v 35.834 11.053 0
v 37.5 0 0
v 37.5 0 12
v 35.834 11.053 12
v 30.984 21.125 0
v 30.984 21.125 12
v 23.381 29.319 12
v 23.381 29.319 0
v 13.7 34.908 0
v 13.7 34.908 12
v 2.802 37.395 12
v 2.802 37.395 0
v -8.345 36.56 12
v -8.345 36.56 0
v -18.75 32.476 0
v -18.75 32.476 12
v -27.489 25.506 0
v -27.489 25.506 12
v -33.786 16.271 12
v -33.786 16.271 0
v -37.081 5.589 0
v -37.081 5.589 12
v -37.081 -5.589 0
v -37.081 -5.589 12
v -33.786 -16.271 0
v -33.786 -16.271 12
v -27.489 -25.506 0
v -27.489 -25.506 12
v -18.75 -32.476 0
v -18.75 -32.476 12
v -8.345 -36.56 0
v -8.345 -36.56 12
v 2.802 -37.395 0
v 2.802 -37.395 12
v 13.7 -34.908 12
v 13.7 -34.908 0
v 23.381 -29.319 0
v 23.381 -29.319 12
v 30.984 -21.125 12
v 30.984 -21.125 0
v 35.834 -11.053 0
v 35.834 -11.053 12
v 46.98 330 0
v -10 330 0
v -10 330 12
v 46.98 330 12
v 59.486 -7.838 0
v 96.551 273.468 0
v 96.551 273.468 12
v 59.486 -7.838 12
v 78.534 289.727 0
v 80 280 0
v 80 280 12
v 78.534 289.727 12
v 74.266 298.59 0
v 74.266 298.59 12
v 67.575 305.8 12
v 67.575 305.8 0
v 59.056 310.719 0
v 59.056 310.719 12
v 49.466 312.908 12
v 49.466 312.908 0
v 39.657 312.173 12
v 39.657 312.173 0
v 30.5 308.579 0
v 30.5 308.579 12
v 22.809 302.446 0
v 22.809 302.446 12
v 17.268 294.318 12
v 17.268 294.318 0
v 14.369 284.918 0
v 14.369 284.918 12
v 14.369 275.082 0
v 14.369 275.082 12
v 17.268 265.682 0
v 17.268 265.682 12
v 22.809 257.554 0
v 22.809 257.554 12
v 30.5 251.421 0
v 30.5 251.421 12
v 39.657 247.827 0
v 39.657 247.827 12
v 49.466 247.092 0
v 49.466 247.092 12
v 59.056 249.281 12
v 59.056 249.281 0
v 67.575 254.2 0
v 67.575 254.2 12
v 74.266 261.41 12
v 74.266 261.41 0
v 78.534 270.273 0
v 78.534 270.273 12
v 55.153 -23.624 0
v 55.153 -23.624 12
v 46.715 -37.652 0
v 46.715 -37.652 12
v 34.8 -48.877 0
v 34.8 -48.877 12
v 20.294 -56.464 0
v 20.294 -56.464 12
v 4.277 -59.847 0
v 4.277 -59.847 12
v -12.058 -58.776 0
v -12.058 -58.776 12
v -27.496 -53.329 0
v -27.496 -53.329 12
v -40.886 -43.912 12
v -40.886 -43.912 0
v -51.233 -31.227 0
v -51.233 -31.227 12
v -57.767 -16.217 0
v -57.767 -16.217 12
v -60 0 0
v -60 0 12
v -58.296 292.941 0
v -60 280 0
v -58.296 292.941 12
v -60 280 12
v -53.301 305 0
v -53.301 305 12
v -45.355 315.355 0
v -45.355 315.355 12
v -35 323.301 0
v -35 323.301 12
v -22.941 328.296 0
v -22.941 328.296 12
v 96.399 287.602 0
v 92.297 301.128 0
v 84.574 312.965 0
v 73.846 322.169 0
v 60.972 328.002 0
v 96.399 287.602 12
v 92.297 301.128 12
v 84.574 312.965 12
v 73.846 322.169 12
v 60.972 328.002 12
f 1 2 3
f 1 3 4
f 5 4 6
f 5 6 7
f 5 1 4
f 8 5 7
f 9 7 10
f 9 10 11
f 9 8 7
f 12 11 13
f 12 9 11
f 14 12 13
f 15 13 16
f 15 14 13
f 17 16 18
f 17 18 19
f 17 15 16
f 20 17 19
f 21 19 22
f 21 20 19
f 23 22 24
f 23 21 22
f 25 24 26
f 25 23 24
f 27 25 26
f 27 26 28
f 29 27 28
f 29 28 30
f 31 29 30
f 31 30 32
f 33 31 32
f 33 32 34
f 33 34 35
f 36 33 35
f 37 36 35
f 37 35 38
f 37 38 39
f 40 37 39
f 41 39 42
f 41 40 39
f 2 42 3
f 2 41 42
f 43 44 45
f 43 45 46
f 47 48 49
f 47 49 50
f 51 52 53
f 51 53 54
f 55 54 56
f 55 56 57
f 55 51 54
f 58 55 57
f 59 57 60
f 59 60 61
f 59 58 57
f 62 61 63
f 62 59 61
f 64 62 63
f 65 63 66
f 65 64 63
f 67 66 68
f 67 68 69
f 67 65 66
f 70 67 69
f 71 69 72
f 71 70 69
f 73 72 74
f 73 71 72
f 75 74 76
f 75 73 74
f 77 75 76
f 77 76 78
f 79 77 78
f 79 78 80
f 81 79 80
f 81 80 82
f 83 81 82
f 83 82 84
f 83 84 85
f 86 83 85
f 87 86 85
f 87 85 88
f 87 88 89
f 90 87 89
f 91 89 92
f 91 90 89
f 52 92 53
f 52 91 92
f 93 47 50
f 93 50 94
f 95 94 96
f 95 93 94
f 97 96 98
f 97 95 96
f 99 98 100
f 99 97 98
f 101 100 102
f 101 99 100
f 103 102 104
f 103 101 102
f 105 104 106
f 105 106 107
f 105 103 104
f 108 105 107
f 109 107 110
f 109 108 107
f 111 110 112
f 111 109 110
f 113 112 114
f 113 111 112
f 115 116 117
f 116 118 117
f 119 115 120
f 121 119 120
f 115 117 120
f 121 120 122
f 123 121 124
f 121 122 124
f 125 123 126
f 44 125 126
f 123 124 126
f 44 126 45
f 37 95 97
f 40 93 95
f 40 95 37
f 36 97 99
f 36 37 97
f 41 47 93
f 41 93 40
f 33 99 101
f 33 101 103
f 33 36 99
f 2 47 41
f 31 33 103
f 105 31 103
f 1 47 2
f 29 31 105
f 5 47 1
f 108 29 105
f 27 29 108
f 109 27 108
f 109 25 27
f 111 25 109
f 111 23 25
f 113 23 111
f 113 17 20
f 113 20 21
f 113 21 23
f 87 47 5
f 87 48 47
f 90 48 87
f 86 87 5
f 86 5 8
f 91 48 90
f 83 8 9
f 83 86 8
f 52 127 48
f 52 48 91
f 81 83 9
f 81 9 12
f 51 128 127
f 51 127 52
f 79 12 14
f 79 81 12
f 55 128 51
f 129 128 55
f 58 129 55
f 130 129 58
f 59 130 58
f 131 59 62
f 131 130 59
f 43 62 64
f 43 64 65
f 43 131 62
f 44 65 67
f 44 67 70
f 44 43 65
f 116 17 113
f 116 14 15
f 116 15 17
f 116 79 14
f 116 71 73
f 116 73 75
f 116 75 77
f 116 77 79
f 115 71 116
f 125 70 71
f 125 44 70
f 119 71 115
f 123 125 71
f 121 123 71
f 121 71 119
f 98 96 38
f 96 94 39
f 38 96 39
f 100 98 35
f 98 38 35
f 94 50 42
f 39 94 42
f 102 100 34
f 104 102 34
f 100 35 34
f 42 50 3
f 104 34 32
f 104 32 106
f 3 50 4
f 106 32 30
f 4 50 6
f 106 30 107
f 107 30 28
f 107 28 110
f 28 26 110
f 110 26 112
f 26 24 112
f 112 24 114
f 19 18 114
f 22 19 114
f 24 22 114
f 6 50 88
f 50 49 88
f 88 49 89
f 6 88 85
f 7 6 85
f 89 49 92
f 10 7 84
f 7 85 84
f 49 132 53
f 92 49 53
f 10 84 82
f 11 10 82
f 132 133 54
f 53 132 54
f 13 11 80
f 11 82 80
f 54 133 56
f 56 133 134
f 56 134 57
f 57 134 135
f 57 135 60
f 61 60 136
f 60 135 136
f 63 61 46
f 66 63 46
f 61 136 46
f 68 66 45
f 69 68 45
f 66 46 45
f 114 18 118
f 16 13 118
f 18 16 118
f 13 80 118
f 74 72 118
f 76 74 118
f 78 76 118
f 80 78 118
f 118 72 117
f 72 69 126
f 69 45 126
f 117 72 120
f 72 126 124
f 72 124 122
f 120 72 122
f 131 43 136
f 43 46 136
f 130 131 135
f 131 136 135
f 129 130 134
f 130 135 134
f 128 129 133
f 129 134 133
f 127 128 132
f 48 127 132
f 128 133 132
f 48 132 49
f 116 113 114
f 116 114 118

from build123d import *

# Parameters (mm, degrees)
SKETCH_1_R      = 37.5
SKETCH_1_R_2    = 33
EXTRUDE_1_DEPTH = 12
FILLET_1_R      = 50


with BuildPart() as part:
    # 草图1 → 凸台-拉伸1 (new body)
    with BuildSketch(Plane.XY):
        with BuildLine():
            Line((-60, 0), (-60, 330))
            Line((-60, 330), (104, 330))
            Line((104, 330), (59.485849651, -7.837964739))
            ThreePointArc((59.485849651, -7.837964739), (-3.927405054, -59.871324435), (-60, 0))
        make_face()
        Circle(SKETCH_1_R, mode=Mode.SUBTRACT)
        with Locations((47, 280)):
            Circle(SKETCH_1_R_2, mode=Mode.SUBTRACT)
    extrude(amount=EXTRUDE_1_DEPTH)

    # 圆角1
    fillet_1_edges = [part.edges().sort_by_distance(p)[0] for p in [
        (-60, 330, 6),
        (104, 330, 6),
    ]]
    fillet(fillet_1_edges, radius=FILLET_1_R)


solid = part.part
